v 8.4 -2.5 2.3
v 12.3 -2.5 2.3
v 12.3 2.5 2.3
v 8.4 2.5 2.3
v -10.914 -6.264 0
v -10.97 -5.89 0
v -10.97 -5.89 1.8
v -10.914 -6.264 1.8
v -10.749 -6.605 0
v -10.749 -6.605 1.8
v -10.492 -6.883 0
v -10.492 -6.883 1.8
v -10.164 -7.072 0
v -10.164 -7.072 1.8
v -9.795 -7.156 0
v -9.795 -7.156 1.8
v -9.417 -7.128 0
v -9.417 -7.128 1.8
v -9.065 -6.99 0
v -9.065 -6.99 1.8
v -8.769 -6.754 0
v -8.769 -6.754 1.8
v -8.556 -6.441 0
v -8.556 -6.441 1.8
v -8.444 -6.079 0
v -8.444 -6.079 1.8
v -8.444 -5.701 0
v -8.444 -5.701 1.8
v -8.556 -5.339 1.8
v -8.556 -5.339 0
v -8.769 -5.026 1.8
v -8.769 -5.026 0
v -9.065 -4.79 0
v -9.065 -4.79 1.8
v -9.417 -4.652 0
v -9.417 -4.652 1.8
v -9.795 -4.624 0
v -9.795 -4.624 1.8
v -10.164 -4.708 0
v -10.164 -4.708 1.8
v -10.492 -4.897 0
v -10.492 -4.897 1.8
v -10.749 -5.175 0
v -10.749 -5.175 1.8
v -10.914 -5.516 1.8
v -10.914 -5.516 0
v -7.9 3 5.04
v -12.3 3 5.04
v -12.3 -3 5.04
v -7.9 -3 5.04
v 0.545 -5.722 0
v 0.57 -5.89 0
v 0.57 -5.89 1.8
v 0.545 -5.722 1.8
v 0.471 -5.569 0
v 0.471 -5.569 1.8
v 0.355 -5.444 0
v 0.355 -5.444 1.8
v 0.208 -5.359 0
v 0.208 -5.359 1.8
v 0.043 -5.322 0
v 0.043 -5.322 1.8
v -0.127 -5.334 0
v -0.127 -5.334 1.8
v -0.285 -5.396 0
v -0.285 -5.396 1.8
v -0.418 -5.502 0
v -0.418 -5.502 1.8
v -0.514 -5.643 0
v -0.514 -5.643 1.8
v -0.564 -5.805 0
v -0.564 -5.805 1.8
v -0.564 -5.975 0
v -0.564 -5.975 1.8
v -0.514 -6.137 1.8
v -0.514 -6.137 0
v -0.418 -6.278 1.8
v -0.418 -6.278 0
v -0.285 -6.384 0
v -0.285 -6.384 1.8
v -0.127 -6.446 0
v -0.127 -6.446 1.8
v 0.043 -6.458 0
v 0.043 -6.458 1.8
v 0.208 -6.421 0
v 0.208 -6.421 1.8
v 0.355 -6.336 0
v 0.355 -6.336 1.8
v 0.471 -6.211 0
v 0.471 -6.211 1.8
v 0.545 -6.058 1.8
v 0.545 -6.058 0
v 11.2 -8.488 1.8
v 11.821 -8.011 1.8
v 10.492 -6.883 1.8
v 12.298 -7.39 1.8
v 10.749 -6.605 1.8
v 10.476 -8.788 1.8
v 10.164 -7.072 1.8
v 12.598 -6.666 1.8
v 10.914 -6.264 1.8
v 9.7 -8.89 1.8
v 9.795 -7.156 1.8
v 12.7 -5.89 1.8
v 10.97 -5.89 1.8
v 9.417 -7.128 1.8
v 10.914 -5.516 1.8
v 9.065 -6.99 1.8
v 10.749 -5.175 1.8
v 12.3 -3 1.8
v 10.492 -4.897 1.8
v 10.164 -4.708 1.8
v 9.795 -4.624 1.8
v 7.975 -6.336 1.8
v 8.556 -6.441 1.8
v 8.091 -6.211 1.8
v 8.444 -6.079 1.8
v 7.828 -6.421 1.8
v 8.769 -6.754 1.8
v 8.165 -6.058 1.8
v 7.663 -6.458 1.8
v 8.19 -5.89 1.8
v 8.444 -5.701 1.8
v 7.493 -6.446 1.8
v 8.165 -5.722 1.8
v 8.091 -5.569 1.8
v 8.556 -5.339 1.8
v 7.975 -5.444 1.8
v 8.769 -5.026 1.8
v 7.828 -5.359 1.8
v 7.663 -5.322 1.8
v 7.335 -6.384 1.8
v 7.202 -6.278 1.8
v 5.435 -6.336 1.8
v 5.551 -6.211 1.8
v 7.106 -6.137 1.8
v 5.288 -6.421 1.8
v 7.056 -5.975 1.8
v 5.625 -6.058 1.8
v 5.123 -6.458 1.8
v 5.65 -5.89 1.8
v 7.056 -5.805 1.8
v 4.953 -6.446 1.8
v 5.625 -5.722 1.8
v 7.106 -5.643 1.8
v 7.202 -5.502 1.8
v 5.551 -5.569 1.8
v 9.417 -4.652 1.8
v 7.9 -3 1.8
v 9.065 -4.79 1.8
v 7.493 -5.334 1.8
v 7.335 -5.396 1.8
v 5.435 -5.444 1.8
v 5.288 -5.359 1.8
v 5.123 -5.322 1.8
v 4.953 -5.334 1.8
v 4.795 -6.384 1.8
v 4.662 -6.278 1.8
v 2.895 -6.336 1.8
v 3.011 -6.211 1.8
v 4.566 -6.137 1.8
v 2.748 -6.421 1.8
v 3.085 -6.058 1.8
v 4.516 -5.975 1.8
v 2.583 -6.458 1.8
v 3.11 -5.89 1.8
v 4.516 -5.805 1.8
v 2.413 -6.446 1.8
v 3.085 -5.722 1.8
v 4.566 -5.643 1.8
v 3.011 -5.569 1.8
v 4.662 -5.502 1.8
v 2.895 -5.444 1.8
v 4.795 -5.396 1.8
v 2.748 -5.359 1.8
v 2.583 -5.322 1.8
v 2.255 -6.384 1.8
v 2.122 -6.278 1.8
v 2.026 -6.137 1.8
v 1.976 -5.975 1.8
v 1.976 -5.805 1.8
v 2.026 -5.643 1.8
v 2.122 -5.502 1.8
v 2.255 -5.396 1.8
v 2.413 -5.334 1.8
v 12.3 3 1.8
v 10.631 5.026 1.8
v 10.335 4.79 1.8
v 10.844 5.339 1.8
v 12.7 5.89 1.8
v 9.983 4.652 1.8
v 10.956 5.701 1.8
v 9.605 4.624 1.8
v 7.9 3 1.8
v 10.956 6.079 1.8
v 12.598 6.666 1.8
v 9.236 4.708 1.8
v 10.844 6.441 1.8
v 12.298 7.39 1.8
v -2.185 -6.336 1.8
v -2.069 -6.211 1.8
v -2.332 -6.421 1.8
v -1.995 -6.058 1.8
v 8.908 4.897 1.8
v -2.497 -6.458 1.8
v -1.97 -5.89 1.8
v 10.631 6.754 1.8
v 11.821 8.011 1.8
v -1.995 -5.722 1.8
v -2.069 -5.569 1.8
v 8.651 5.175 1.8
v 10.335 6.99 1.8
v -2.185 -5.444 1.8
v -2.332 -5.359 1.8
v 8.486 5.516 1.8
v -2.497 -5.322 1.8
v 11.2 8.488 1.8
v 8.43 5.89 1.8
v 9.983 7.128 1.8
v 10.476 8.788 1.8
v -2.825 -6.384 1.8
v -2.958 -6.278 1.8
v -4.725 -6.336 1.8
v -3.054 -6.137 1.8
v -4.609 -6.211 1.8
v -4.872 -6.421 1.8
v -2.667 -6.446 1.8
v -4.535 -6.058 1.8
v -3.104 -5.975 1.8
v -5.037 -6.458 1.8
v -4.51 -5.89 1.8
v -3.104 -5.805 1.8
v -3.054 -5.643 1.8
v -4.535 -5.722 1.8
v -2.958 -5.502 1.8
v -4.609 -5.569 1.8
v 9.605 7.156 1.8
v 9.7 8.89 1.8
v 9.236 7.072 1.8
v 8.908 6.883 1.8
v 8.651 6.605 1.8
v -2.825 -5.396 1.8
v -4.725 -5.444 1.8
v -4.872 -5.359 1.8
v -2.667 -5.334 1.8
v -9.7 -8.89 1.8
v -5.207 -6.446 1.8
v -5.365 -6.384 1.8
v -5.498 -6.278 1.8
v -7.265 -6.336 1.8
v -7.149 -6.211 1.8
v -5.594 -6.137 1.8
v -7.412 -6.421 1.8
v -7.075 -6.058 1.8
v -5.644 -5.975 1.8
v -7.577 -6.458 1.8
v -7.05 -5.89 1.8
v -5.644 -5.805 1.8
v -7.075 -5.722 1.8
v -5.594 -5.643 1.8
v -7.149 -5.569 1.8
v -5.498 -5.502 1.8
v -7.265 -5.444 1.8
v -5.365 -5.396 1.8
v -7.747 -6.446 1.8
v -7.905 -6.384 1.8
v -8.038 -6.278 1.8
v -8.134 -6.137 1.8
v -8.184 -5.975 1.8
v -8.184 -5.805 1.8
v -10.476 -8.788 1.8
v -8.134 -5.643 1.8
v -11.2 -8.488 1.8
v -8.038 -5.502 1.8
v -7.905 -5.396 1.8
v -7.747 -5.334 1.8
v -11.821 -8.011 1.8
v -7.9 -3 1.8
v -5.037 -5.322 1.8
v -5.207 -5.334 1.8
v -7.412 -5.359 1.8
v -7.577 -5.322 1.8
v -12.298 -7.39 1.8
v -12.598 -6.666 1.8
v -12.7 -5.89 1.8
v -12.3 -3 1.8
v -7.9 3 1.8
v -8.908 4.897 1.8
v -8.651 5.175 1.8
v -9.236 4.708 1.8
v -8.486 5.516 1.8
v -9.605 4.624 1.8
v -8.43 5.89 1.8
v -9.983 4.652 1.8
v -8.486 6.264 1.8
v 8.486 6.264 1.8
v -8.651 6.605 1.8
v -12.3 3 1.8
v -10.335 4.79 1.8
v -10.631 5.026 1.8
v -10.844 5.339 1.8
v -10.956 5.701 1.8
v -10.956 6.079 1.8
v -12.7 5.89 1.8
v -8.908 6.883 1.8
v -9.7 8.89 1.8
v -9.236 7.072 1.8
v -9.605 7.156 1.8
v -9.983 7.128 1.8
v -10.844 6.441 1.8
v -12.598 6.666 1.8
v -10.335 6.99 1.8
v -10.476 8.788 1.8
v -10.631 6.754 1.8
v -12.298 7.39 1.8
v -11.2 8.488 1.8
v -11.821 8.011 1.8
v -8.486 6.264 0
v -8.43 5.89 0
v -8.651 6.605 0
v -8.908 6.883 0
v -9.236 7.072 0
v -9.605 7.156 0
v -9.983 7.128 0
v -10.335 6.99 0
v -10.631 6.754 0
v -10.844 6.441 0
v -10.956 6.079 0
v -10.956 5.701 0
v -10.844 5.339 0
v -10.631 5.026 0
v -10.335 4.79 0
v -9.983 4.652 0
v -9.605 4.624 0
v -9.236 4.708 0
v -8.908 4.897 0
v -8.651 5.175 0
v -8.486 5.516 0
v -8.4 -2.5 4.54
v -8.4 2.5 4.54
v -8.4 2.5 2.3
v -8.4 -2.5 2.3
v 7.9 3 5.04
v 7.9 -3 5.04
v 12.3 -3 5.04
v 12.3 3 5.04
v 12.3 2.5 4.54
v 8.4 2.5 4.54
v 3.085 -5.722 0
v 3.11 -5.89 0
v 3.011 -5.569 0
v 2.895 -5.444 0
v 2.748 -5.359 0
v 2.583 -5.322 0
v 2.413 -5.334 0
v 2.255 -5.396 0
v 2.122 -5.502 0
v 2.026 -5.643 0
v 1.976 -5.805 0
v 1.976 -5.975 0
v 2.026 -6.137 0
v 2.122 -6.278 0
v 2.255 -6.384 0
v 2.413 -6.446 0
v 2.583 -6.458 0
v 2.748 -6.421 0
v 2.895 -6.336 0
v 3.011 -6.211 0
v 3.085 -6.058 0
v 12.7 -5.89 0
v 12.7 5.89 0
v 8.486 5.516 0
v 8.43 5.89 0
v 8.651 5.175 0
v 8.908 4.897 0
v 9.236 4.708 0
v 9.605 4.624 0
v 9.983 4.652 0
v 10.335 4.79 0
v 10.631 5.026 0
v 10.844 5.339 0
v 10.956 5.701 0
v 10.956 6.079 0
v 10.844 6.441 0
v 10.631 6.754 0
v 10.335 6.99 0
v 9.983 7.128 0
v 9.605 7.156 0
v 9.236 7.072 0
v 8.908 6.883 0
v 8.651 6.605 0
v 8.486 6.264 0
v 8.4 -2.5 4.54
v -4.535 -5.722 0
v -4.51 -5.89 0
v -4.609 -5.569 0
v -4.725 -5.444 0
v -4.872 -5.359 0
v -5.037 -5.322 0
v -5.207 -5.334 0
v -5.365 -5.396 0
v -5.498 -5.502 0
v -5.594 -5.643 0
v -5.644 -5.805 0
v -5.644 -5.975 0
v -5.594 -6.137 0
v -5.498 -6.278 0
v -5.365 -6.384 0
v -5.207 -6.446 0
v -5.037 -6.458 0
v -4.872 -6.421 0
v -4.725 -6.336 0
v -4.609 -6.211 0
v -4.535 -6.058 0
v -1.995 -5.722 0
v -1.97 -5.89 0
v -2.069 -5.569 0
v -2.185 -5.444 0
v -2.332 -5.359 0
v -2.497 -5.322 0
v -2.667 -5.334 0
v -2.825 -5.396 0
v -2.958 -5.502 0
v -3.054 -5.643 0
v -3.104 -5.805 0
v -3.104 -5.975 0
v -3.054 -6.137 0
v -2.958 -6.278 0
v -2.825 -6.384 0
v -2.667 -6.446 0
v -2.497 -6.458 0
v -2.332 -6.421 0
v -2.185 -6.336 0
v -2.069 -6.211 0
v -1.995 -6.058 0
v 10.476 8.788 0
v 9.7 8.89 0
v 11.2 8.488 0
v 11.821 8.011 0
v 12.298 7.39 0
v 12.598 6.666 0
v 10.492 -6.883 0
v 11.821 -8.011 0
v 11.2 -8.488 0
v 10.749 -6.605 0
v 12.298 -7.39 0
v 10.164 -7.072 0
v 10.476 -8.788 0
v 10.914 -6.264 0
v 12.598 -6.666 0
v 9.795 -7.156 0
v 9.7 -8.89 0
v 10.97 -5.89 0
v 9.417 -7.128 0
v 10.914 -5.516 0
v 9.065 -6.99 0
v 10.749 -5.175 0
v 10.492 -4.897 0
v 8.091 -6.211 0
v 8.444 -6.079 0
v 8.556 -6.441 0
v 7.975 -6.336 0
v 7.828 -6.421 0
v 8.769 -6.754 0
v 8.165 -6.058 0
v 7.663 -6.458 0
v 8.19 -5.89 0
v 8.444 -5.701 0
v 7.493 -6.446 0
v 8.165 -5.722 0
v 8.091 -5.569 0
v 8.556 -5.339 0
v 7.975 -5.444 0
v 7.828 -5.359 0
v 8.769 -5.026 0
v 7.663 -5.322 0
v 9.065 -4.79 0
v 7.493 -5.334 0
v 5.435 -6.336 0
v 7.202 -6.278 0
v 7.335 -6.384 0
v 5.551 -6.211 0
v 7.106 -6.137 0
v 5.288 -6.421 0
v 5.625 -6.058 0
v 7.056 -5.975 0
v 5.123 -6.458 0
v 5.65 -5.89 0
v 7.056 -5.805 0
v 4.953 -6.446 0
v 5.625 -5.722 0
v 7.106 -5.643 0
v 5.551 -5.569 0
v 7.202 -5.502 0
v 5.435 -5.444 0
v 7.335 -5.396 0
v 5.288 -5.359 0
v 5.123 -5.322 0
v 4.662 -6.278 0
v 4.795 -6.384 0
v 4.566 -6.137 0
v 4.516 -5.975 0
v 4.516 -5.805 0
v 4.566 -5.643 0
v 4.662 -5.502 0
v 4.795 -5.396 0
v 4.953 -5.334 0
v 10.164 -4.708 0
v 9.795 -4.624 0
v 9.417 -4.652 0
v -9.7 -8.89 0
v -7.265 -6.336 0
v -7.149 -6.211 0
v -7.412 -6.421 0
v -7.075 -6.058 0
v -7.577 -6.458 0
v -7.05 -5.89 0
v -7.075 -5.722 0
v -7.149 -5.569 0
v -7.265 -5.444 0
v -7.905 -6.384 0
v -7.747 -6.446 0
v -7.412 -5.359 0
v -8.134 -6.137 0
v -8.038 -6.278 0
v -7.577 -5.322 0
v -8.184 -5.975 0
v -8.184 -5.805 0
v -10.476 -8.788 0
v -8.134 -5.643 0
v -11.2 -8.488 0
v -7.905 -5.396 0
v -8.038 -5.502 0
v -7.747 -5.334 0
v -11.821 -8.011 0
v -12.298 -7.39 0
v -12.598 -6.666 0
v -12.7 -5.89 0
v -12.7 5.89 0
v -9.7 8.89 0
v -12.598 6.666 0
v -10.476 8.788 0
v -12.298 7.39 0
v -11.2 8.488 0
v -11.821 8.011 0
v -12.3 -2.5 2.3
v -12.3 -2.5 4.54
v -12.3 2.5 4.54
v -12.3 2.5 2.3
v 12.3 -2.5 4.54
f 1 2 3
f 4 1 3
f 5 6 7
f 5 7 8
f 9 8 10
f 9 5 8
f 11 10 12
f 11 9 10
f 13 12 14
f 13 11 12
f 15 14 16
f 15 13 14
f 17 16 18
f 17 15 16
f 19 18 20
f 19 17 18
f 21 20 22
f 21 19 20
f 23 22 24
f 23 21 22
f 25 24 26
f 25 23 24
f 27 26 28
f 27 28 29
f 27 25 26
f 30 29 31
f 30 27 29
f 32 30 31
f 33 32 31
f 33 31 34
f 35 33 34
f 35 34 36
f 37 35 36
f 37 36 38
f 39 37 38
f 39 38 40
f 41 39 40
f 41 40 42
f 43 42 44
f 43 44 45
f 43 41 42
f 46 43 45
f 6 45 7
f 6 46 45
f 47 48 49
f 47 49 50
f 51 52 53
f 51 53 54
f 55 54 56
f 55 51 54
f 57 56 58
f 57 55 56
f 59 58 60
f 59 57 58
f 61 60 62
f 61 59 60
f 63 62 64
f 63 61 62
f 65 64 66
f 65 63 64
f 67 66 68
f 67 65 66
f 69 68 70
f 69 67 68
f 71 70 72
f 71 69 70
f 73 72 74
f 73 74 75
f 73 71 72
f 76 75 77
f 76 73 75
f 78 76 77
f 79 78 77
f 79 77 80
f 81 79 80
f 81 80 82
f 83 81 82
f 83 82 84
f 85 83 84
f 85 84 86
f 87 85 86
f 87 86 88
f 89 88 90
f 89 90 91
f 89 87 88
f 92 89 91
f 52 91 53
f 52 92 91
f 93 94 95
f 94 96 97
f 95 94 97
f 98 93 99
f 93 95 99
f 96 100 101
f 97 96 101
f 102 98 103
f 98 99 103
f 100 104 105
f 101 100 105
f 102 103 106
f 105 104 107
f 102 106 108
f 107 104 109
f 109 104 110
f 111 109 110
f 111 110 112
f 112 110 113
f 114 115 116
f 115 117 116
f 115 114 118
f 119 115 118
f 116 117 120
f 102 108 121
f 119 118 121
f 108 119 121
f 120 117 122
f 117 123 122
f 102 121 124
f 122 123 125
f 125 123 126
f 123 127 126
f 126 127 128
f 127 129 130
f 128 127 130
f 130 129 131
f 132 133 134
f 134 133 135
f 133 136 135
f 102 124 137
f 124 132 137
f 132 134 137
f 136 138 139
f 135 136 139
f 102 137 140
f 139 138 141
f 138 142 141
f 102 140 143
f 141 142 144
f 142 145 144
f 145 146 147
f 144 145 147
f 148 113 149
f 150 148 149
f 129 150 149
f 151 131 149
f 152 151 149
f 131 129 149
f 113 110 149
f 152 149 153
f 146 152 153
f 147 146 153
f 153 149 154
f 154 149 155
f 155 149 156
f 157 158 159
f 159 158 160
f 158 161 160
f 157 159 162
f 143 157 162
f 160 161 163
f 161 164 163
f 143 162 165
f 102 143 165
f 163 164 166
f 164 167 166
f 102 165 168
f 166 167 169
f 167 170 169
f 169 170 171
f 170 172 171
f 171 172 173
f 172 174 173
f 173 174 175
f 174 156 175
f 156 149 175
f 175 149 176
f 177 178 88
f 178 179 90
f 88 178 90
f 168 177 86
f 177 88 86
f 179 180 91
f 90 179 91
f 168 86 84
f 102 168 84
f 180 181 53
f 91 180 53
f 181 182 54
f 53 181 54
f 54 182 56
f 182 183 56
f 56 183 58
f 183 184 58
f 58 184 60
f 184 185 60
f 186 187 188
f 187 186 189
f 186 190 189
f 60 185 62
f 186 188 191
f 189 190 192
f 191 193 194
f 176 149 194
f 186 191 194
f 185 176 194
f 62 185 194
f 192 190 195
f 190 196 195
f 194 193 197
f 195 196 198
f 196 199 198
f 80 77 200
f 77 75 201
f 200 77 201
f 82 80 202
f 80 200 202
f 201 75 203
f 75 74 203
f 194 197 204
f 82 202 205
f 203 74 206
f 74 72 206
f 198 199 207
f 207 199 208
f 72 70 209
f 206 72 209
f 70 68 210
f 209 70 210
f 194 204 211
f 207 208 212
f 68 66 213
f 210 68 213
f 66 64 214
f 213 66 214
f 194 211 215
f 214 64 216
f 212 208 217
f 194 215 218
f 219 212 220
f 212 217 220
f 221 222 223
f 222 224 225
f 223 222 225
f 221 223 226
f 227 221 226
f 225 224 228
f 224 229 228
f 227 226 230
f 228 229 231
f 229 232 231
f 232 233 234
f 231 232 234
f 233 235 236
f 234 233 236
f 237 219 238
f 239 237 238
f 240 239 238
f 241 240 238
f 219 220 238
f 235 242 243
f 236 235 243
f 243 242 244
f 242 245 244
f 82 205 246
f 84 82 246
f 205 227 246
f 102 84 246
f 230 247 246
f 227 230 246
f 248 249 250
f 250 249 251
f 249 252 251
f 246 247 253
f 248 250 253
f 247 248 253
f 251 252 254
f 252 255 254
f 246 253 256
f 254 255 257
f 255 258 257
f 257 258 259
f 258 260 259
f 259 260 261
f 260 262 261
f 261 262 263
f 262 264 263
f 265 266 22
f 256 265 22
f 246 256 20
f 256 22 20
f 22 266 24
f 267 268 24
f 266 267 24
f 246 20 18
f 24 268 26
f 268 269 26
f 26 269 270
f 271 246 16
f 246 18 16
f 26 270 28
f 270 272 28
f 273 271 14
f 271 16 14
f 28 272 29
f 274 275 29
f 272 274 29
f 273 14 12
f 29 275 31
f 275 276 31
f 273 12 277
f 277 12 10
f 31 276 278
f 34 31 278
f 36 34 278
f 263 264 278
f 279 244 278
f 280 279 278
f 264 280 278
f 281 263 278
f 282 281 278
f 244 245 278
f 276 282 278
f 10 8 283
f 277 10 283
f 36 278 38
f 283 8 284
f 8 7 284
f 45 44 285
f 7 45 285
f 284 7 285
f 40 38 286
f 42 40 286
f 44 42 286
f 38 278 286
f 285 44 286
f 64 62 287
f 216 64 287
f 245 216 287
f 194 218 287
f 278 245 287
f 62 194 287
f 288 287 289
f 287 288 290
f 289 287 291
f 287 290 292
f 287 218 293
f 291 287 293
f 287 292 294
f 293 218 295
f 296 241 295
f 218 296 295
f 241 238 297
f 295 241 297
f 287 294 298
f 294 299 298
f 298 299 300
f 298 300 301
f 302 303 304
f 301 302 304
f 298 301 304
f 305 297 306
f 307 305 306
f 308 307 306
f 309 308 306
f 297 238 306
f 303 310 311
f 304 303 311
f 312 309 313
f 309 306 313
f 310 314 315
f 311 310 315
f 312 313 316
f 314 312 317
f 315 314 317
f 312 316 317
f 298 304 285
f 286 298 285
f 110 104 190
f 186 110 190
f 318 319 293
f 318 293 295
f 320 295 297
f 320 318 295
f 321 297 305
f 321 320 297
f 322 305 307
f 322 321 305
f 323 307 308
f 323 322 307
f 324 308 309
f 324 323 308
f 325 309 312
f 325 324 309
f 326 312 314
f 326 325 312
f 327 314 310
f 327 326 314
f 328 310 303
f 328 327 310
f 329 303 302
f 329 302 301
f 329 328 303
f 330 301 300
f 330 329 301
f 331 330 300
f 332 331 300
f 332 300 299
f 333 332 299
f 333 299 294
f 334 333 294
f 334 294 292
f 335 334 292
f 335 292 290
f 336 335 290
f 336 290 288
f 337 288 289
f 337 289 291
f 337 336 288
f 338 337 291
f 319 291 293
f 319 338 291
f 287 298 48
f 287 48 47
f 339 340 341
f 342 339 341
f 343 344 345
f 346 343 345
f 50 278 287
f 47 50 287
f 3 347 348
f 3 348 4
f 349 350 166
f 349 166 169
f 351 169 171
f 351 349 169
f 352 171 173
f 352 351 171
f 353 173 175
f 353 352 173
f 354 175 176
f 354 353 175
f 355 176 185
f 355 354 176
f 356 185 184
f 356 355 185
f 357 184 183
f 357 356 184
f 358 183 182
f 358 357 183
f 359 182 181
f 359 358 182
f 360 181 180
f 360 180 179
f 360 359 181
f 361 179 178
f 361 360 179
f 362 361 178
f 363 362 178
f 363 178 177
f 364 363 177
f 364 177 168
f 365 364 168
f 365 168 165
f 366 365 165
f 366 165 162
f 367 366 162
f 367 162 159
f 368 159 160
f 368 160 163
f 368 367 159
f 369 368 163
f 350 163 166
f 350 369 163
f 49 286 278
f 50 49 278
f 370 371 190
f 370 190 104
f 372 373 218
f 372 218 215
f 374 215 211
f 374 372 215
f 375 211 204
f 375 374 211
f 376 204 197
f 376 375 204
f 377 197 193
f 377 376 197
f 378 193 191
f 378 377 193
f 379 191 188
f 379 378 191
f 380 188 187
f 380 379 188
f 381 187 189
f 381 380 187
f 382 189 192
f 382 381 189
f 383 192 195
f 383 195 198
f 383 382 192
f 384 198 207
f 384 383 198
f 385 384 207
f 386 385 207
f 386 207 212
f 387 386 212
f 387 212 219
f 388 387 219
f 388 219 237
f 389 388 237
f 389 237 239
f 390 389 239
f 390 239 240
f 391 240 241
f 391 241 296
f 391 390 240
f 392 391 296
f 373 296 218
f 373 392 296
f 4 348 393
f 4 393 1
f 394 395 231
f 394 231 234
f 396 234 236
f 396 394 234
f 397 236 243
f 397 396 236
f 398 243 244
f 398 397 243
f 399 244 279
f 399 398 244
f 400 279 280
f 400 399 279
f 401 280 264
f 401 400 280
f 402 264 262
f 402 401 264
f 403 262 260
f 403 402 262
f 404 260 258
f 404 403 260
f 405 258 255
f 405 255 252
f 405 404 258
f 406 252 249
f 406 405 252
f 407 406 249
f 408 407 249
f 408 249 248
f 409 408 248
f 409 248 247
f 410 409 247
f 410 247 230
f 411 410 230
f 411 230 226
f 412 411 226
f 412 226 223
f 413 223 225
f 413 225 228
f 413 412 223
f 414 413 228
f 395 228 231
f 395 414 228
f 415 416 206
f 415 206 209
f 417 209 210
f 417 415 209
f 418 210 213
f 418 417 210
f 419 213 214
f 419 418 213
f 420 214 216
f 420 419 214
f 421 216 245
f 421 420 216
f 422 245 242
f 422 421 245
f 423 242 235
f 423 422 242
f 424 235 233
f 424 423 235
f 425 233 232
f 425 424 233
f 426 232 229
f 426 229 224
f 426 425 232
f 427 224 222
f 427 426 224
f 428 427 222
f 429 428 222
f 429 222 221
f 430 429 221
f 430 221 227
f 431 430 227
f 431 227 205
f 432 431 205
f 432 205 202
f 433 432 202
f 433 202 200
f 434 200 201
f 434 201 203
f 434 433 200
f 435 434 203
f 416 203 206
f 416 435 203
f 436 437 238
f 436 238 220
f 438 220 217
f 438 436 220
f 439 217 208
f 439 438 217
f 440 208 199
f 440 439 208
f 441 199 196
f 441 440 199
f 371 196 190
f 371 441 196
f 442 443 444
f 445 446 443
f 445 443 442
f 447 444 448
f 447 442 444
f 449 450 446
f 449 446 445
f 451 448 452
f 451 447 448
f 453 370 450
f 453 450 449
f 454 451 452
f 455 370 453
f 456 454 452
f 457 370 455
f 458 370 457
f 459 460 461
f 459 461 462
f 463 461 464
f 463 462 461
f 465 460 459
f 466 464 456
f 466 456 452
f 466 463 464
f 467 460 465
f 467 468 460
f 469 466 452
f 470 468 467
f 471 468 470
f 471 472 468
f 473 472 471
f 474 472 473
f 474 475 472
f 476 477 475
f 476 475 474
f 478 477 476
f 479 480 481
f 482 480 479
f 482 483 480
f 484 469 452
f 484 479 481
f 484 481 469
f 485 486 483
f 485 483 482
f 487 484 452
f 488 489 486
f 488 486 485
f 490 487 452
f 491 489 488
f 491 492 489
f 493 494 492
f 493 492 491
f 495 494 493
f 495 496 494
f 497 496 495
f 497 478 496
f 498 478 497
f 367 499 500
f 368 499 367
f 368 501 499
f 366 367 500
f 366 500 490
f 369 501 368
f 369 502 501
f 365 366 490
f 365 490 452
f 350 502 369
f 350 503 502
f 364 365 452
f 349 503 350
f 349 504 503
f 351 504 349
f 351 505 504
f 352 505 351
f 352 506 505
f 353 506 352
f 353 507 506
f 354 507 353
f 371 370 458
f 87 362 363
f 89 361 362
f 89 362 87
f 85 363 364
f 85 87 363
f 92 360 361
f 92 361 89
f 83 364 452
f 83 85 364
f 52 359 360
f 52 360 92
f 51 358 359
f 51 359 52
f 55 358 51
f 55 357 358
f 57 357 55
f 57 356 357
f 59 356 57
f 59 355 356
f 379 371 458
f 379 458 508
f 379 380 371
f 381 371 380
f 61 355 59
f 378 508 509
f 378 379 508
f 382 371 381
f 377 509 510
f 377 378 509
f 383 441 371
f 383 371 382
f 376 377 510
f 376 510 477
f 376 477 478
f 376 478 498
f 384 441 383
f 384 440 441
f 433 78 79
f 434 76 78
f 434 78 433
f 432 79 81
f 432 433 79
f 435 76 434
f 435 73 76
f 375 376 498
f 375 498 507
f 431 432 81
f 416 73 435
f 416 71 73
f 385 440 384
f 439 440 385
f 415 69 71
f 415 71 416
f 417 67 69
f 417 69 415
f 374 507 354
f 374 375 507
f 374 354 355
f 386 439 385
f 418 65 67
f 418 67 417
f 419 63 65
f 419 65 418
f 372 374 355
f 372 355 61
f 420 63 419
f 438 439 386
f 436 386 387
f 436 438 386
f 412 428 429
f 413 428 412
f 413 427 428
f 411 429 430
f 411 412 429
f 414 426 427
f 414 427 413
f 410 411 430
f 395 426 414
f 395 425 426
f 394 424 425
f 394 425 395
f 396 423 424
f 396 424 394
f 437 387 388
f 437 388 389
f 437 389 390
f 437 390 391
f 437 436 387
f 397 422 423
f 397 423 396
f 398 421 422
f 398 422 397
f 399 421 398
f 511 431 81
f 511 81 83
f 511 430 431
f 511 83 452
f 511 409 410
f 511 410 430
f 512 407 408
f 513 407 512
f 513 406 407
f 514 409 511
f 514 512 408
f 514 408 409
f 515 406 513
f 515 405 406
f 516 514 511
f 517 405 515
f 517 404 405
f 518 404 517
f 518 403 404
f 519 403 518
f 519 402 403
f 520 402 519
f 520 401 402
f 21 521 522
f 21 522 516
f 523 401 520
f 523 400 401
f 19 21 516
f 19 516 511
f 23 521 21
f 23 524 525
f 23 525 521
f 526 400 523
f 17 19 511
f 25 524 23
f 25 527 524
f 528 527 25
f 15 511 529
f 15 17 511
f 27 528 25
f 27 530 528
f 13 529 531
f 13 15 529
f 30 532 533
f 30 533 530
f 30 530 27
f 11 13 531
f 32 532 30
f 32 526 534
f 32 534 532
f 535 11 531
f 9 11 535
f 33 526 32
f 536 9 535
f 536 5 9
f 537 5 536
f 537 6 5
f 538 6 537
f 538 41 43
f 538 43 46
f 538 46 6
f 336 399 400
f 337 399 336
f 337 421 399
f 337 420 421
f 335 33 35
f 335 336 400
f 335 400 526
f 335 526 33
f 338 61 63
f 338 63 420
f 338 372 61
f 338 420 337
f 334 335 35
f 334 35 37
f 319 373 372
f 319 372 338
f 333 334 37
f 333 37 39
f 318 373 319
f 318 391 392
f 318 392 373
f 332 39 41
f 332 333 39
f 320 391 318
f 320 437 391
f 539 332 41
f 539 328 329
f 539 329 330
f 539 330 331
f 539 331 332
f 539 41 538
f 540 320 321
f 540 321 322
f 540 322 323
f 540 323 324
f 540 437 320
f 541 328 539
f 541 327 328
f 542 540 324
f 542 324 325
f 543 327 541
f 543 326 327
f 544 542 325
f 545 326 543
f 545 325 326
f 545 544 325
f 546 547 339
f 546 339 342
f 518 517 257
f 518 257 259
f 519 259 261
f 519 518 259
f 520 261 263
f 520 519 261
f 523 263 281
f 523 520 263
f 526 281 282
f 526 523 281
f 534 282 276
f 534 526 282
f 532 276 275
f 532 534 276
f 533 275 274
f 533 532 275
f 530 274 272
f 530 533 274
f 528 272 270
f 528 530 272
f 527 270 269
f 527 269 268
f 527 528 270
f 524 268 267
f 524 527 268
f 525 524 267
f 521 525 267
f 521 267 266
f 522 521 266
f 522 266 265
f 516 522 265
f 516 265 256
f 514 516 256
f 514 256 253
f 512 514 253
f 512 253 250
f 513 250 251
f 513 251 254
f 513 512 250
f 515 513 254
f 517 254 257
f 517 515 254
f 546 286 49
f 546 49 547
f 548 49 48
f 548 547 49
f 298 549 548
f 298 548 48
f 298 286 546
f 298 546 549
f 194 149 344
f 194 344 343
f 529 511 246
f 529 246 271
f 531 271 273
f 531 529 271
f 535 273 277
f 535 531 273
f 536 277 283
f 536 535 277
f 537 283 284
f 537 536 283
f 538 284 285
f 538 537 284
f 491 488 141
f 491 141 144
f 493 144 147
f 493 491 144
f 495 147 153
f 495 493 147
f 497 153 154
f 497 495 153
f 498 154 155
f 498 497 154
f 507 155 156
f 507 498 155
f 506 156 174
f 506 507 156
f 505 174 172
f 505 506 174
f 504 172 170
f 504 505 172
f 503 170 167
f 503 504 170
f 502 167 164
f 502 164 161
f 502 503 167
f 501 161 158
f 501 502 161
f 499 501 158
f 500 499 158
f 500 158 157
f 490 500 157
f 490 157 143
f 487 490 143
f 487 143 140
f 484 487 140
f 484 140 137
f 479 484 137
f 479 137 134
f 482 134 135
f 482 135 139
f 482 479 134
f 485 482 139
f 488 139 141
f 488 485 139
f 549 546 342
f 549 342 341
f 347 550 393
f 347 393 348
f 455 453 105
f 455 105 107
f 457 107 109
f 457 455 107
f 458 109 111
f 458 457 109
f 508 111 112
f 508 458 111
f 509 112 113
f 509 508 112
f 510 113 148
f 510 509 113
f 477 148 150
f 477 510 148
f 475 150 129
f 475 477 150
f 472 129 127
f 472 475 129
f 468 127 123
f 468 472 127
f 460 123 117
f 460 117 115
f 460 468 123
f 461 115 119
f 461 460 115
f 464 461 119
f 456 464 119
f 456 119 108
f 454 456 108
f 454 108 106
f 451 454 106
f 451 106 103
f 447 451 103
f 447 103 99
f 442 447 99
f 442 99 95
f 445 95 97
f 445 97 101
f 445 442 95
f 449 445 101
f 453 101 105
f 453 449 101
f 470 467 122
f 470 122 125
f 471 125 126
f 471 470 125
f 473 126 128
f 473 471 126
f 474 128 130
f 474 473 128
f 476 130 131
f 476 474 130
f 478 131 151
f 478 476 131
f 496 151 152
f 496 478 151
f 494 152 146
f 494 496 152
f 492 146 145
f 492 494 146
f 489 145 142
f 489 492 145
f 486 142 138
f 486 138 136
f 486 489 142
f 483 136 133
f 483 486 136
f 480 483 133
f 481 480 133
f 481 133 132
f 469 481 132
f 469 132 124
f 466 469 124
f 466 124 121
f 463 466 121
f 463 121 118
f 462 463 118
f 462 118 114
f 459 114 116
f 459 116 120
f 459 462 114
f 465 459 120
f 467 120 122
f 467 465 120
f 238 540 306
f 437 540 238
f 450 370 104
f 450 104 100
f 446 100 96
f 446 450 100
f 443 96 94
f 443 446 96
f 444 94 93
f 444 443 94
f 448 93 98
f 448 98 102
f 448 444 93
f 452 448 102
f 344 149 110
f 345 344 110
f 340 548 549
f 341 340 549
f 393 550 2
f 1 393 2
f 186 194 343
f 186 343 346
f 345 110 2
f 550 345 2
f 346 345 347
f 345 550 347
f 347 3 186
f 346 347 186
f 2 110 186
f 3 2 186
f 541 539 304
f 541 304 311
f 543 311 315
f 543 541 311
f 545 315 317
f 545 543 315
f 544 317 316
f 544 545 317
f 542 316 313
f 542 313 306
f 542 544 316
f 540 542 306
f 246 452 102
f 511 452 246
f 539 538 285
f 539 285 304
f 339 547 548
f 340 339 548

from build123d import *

# Parameters (mm, degrees)
CROQUIS1_R              = 1.27
CROQUIS1_R_2            = 0.57
SALIENTE_EXTRUIR1_DEPTH = 1.8
CROQUIS2_W              = 4.4
CROQUIS2_H              = 6
SALIENTE_EXTRUIR2_DEPTH = 3.24
CROQUIS3_W              = 2.24
CROQUIS3_H              = 5
CORTAR_EXTRUIR2_DEPTH   = 3.9
CORTAR_EXTRUIR3_START   = -24.6
CROQUIS3_3_W            = 2.24
CROQUIS3_3_H            = 5
CORTAR_EXTRUIR3_DEPTH   = 3.9


with BuildPart() as part:
    # Croquis1 → Saliente-Extruir1 (new body)
    with BuildSketch(Plane.XY):
        with BuildLine():
            Line((9.7, -8.89), (-9.7, -8.89))
            ThreePointArc((-9.7, -8.89), (-11.821320344, -8.011320344), (-12.7, -5.89))
            Line((-12.7, -5.89), (-12.7, 5.89))
            ThreePointArc((-12.7, 5.89), (-11.821320344, 8.011320344), (-9.7, 8.89))
            Line((-9.7, 8.89), (9.7, 8.89))
            ThreePointArc((9.7, 8.89), (11.821320344, 8.011320344), (12.7, 5.89))
            Line((12.7, 5.89), (12.7, -5.89))
            ThreePointArc((12.7, -5.89), (11.821320344, -8.011320344), (9.7, -8.89))
        make_face()
        with Locations((-9.7, 5.89)):
            Circle(CROQUIS1_R, mode=Mode.SUBTRACT)
        with Locations(Location((9.7, 5.89, 0), (0, 0, 180))):
            Circle(CROQUIS1_R, mode=Mode.SUBTRACT)
        with Locations((9.7, -5.89)):
            Circle(CROQUIS1_R, mode=Mode.SUBTRACT)
        with Locations(Location((-9.7, -5.89, 0), (0, 0, 180))):
            Circle(CROQUIS1_R, mode=Mode.SUBTRACT)
        with Locations((-7.62, -5.89)):
            Circle(CROQUIS1_R_2, mode=Mode.SUBTRACT)
        with Locations((-5.08, -5.89)):
            Circle(CROQUIS1_R_2, mode=Mode.SUBTRACT)
        with Locations((-2.54, -5.89)):
            Circle(CROQUIS1_R_2, mode=Mode.SUBTRACT)
        with Locations((0, -5.89)):
            Circle(CROQUIS1_R_2, mode=Mode.SUBTRACT)
        with Locations((2.54, -5.89)):
            Circle(CROQUIS1_R_2, mode=Mode.SUBTRACT)
        with Locations((5.08, -5.89)):
            Circle(CROQUIS1_R_2, mode=Mode.SUBTRACT)
        with Locations((7.62, -5.89)):
            Circle(CROQUIS1_R_2, mode=Mode.SUBTRACT)
    extrude(amount=SALIENTE_EXTRUIR1_DEPTH)

    # Croquis2 → Saliente-Extruir2 (add)
    with BuildSketch(Plane.XY.offset(1.8)):
        with Locations((-10.1, 0)):
            Rectangle(CROQUIS2_W, CROQUIS2_H)
        with Locations((10.1, 0)):
            Rectangle(CROQUIS2_W, CROQUIS2_H)
    extrude(amount=SALIENTE_EXTRUIR2_DEPTH)

    # Croquis3 → Cortar-Extruir2 (cut)
    with BuildSketch(Plane(origin=(12.3, 0, 0), x_dir=(0, 0, -1), z_dir=(1, 0, 0))):
        with Locations((-3.42, 0)):
            Rectangle(CROQUIS3_W, CROQUIS3_H)
    extrude(amount=-CORTAR_EXTRUIR2_DEPTH, mode=Mode.SUBTRACT)

    # Croquis3<3> → Cortar-Extruir3 (cut)
    with BuildSketch(Plane(origin=(12.3, 0, 0), x_dir=(0, 0, -1), z_dir=(1, 0, 0)).offset(CORTAR_EXTRUIR3_START)):
        with Locations((-3.42, 0)):
            Rectangle(CROQUIS3_3_W, CROQUIS3_3_H)
    extrude(amount=CORTAR_EXTRUIR3_DEPTH, mode=Mode.SUBTRACT)


solid = part.part
